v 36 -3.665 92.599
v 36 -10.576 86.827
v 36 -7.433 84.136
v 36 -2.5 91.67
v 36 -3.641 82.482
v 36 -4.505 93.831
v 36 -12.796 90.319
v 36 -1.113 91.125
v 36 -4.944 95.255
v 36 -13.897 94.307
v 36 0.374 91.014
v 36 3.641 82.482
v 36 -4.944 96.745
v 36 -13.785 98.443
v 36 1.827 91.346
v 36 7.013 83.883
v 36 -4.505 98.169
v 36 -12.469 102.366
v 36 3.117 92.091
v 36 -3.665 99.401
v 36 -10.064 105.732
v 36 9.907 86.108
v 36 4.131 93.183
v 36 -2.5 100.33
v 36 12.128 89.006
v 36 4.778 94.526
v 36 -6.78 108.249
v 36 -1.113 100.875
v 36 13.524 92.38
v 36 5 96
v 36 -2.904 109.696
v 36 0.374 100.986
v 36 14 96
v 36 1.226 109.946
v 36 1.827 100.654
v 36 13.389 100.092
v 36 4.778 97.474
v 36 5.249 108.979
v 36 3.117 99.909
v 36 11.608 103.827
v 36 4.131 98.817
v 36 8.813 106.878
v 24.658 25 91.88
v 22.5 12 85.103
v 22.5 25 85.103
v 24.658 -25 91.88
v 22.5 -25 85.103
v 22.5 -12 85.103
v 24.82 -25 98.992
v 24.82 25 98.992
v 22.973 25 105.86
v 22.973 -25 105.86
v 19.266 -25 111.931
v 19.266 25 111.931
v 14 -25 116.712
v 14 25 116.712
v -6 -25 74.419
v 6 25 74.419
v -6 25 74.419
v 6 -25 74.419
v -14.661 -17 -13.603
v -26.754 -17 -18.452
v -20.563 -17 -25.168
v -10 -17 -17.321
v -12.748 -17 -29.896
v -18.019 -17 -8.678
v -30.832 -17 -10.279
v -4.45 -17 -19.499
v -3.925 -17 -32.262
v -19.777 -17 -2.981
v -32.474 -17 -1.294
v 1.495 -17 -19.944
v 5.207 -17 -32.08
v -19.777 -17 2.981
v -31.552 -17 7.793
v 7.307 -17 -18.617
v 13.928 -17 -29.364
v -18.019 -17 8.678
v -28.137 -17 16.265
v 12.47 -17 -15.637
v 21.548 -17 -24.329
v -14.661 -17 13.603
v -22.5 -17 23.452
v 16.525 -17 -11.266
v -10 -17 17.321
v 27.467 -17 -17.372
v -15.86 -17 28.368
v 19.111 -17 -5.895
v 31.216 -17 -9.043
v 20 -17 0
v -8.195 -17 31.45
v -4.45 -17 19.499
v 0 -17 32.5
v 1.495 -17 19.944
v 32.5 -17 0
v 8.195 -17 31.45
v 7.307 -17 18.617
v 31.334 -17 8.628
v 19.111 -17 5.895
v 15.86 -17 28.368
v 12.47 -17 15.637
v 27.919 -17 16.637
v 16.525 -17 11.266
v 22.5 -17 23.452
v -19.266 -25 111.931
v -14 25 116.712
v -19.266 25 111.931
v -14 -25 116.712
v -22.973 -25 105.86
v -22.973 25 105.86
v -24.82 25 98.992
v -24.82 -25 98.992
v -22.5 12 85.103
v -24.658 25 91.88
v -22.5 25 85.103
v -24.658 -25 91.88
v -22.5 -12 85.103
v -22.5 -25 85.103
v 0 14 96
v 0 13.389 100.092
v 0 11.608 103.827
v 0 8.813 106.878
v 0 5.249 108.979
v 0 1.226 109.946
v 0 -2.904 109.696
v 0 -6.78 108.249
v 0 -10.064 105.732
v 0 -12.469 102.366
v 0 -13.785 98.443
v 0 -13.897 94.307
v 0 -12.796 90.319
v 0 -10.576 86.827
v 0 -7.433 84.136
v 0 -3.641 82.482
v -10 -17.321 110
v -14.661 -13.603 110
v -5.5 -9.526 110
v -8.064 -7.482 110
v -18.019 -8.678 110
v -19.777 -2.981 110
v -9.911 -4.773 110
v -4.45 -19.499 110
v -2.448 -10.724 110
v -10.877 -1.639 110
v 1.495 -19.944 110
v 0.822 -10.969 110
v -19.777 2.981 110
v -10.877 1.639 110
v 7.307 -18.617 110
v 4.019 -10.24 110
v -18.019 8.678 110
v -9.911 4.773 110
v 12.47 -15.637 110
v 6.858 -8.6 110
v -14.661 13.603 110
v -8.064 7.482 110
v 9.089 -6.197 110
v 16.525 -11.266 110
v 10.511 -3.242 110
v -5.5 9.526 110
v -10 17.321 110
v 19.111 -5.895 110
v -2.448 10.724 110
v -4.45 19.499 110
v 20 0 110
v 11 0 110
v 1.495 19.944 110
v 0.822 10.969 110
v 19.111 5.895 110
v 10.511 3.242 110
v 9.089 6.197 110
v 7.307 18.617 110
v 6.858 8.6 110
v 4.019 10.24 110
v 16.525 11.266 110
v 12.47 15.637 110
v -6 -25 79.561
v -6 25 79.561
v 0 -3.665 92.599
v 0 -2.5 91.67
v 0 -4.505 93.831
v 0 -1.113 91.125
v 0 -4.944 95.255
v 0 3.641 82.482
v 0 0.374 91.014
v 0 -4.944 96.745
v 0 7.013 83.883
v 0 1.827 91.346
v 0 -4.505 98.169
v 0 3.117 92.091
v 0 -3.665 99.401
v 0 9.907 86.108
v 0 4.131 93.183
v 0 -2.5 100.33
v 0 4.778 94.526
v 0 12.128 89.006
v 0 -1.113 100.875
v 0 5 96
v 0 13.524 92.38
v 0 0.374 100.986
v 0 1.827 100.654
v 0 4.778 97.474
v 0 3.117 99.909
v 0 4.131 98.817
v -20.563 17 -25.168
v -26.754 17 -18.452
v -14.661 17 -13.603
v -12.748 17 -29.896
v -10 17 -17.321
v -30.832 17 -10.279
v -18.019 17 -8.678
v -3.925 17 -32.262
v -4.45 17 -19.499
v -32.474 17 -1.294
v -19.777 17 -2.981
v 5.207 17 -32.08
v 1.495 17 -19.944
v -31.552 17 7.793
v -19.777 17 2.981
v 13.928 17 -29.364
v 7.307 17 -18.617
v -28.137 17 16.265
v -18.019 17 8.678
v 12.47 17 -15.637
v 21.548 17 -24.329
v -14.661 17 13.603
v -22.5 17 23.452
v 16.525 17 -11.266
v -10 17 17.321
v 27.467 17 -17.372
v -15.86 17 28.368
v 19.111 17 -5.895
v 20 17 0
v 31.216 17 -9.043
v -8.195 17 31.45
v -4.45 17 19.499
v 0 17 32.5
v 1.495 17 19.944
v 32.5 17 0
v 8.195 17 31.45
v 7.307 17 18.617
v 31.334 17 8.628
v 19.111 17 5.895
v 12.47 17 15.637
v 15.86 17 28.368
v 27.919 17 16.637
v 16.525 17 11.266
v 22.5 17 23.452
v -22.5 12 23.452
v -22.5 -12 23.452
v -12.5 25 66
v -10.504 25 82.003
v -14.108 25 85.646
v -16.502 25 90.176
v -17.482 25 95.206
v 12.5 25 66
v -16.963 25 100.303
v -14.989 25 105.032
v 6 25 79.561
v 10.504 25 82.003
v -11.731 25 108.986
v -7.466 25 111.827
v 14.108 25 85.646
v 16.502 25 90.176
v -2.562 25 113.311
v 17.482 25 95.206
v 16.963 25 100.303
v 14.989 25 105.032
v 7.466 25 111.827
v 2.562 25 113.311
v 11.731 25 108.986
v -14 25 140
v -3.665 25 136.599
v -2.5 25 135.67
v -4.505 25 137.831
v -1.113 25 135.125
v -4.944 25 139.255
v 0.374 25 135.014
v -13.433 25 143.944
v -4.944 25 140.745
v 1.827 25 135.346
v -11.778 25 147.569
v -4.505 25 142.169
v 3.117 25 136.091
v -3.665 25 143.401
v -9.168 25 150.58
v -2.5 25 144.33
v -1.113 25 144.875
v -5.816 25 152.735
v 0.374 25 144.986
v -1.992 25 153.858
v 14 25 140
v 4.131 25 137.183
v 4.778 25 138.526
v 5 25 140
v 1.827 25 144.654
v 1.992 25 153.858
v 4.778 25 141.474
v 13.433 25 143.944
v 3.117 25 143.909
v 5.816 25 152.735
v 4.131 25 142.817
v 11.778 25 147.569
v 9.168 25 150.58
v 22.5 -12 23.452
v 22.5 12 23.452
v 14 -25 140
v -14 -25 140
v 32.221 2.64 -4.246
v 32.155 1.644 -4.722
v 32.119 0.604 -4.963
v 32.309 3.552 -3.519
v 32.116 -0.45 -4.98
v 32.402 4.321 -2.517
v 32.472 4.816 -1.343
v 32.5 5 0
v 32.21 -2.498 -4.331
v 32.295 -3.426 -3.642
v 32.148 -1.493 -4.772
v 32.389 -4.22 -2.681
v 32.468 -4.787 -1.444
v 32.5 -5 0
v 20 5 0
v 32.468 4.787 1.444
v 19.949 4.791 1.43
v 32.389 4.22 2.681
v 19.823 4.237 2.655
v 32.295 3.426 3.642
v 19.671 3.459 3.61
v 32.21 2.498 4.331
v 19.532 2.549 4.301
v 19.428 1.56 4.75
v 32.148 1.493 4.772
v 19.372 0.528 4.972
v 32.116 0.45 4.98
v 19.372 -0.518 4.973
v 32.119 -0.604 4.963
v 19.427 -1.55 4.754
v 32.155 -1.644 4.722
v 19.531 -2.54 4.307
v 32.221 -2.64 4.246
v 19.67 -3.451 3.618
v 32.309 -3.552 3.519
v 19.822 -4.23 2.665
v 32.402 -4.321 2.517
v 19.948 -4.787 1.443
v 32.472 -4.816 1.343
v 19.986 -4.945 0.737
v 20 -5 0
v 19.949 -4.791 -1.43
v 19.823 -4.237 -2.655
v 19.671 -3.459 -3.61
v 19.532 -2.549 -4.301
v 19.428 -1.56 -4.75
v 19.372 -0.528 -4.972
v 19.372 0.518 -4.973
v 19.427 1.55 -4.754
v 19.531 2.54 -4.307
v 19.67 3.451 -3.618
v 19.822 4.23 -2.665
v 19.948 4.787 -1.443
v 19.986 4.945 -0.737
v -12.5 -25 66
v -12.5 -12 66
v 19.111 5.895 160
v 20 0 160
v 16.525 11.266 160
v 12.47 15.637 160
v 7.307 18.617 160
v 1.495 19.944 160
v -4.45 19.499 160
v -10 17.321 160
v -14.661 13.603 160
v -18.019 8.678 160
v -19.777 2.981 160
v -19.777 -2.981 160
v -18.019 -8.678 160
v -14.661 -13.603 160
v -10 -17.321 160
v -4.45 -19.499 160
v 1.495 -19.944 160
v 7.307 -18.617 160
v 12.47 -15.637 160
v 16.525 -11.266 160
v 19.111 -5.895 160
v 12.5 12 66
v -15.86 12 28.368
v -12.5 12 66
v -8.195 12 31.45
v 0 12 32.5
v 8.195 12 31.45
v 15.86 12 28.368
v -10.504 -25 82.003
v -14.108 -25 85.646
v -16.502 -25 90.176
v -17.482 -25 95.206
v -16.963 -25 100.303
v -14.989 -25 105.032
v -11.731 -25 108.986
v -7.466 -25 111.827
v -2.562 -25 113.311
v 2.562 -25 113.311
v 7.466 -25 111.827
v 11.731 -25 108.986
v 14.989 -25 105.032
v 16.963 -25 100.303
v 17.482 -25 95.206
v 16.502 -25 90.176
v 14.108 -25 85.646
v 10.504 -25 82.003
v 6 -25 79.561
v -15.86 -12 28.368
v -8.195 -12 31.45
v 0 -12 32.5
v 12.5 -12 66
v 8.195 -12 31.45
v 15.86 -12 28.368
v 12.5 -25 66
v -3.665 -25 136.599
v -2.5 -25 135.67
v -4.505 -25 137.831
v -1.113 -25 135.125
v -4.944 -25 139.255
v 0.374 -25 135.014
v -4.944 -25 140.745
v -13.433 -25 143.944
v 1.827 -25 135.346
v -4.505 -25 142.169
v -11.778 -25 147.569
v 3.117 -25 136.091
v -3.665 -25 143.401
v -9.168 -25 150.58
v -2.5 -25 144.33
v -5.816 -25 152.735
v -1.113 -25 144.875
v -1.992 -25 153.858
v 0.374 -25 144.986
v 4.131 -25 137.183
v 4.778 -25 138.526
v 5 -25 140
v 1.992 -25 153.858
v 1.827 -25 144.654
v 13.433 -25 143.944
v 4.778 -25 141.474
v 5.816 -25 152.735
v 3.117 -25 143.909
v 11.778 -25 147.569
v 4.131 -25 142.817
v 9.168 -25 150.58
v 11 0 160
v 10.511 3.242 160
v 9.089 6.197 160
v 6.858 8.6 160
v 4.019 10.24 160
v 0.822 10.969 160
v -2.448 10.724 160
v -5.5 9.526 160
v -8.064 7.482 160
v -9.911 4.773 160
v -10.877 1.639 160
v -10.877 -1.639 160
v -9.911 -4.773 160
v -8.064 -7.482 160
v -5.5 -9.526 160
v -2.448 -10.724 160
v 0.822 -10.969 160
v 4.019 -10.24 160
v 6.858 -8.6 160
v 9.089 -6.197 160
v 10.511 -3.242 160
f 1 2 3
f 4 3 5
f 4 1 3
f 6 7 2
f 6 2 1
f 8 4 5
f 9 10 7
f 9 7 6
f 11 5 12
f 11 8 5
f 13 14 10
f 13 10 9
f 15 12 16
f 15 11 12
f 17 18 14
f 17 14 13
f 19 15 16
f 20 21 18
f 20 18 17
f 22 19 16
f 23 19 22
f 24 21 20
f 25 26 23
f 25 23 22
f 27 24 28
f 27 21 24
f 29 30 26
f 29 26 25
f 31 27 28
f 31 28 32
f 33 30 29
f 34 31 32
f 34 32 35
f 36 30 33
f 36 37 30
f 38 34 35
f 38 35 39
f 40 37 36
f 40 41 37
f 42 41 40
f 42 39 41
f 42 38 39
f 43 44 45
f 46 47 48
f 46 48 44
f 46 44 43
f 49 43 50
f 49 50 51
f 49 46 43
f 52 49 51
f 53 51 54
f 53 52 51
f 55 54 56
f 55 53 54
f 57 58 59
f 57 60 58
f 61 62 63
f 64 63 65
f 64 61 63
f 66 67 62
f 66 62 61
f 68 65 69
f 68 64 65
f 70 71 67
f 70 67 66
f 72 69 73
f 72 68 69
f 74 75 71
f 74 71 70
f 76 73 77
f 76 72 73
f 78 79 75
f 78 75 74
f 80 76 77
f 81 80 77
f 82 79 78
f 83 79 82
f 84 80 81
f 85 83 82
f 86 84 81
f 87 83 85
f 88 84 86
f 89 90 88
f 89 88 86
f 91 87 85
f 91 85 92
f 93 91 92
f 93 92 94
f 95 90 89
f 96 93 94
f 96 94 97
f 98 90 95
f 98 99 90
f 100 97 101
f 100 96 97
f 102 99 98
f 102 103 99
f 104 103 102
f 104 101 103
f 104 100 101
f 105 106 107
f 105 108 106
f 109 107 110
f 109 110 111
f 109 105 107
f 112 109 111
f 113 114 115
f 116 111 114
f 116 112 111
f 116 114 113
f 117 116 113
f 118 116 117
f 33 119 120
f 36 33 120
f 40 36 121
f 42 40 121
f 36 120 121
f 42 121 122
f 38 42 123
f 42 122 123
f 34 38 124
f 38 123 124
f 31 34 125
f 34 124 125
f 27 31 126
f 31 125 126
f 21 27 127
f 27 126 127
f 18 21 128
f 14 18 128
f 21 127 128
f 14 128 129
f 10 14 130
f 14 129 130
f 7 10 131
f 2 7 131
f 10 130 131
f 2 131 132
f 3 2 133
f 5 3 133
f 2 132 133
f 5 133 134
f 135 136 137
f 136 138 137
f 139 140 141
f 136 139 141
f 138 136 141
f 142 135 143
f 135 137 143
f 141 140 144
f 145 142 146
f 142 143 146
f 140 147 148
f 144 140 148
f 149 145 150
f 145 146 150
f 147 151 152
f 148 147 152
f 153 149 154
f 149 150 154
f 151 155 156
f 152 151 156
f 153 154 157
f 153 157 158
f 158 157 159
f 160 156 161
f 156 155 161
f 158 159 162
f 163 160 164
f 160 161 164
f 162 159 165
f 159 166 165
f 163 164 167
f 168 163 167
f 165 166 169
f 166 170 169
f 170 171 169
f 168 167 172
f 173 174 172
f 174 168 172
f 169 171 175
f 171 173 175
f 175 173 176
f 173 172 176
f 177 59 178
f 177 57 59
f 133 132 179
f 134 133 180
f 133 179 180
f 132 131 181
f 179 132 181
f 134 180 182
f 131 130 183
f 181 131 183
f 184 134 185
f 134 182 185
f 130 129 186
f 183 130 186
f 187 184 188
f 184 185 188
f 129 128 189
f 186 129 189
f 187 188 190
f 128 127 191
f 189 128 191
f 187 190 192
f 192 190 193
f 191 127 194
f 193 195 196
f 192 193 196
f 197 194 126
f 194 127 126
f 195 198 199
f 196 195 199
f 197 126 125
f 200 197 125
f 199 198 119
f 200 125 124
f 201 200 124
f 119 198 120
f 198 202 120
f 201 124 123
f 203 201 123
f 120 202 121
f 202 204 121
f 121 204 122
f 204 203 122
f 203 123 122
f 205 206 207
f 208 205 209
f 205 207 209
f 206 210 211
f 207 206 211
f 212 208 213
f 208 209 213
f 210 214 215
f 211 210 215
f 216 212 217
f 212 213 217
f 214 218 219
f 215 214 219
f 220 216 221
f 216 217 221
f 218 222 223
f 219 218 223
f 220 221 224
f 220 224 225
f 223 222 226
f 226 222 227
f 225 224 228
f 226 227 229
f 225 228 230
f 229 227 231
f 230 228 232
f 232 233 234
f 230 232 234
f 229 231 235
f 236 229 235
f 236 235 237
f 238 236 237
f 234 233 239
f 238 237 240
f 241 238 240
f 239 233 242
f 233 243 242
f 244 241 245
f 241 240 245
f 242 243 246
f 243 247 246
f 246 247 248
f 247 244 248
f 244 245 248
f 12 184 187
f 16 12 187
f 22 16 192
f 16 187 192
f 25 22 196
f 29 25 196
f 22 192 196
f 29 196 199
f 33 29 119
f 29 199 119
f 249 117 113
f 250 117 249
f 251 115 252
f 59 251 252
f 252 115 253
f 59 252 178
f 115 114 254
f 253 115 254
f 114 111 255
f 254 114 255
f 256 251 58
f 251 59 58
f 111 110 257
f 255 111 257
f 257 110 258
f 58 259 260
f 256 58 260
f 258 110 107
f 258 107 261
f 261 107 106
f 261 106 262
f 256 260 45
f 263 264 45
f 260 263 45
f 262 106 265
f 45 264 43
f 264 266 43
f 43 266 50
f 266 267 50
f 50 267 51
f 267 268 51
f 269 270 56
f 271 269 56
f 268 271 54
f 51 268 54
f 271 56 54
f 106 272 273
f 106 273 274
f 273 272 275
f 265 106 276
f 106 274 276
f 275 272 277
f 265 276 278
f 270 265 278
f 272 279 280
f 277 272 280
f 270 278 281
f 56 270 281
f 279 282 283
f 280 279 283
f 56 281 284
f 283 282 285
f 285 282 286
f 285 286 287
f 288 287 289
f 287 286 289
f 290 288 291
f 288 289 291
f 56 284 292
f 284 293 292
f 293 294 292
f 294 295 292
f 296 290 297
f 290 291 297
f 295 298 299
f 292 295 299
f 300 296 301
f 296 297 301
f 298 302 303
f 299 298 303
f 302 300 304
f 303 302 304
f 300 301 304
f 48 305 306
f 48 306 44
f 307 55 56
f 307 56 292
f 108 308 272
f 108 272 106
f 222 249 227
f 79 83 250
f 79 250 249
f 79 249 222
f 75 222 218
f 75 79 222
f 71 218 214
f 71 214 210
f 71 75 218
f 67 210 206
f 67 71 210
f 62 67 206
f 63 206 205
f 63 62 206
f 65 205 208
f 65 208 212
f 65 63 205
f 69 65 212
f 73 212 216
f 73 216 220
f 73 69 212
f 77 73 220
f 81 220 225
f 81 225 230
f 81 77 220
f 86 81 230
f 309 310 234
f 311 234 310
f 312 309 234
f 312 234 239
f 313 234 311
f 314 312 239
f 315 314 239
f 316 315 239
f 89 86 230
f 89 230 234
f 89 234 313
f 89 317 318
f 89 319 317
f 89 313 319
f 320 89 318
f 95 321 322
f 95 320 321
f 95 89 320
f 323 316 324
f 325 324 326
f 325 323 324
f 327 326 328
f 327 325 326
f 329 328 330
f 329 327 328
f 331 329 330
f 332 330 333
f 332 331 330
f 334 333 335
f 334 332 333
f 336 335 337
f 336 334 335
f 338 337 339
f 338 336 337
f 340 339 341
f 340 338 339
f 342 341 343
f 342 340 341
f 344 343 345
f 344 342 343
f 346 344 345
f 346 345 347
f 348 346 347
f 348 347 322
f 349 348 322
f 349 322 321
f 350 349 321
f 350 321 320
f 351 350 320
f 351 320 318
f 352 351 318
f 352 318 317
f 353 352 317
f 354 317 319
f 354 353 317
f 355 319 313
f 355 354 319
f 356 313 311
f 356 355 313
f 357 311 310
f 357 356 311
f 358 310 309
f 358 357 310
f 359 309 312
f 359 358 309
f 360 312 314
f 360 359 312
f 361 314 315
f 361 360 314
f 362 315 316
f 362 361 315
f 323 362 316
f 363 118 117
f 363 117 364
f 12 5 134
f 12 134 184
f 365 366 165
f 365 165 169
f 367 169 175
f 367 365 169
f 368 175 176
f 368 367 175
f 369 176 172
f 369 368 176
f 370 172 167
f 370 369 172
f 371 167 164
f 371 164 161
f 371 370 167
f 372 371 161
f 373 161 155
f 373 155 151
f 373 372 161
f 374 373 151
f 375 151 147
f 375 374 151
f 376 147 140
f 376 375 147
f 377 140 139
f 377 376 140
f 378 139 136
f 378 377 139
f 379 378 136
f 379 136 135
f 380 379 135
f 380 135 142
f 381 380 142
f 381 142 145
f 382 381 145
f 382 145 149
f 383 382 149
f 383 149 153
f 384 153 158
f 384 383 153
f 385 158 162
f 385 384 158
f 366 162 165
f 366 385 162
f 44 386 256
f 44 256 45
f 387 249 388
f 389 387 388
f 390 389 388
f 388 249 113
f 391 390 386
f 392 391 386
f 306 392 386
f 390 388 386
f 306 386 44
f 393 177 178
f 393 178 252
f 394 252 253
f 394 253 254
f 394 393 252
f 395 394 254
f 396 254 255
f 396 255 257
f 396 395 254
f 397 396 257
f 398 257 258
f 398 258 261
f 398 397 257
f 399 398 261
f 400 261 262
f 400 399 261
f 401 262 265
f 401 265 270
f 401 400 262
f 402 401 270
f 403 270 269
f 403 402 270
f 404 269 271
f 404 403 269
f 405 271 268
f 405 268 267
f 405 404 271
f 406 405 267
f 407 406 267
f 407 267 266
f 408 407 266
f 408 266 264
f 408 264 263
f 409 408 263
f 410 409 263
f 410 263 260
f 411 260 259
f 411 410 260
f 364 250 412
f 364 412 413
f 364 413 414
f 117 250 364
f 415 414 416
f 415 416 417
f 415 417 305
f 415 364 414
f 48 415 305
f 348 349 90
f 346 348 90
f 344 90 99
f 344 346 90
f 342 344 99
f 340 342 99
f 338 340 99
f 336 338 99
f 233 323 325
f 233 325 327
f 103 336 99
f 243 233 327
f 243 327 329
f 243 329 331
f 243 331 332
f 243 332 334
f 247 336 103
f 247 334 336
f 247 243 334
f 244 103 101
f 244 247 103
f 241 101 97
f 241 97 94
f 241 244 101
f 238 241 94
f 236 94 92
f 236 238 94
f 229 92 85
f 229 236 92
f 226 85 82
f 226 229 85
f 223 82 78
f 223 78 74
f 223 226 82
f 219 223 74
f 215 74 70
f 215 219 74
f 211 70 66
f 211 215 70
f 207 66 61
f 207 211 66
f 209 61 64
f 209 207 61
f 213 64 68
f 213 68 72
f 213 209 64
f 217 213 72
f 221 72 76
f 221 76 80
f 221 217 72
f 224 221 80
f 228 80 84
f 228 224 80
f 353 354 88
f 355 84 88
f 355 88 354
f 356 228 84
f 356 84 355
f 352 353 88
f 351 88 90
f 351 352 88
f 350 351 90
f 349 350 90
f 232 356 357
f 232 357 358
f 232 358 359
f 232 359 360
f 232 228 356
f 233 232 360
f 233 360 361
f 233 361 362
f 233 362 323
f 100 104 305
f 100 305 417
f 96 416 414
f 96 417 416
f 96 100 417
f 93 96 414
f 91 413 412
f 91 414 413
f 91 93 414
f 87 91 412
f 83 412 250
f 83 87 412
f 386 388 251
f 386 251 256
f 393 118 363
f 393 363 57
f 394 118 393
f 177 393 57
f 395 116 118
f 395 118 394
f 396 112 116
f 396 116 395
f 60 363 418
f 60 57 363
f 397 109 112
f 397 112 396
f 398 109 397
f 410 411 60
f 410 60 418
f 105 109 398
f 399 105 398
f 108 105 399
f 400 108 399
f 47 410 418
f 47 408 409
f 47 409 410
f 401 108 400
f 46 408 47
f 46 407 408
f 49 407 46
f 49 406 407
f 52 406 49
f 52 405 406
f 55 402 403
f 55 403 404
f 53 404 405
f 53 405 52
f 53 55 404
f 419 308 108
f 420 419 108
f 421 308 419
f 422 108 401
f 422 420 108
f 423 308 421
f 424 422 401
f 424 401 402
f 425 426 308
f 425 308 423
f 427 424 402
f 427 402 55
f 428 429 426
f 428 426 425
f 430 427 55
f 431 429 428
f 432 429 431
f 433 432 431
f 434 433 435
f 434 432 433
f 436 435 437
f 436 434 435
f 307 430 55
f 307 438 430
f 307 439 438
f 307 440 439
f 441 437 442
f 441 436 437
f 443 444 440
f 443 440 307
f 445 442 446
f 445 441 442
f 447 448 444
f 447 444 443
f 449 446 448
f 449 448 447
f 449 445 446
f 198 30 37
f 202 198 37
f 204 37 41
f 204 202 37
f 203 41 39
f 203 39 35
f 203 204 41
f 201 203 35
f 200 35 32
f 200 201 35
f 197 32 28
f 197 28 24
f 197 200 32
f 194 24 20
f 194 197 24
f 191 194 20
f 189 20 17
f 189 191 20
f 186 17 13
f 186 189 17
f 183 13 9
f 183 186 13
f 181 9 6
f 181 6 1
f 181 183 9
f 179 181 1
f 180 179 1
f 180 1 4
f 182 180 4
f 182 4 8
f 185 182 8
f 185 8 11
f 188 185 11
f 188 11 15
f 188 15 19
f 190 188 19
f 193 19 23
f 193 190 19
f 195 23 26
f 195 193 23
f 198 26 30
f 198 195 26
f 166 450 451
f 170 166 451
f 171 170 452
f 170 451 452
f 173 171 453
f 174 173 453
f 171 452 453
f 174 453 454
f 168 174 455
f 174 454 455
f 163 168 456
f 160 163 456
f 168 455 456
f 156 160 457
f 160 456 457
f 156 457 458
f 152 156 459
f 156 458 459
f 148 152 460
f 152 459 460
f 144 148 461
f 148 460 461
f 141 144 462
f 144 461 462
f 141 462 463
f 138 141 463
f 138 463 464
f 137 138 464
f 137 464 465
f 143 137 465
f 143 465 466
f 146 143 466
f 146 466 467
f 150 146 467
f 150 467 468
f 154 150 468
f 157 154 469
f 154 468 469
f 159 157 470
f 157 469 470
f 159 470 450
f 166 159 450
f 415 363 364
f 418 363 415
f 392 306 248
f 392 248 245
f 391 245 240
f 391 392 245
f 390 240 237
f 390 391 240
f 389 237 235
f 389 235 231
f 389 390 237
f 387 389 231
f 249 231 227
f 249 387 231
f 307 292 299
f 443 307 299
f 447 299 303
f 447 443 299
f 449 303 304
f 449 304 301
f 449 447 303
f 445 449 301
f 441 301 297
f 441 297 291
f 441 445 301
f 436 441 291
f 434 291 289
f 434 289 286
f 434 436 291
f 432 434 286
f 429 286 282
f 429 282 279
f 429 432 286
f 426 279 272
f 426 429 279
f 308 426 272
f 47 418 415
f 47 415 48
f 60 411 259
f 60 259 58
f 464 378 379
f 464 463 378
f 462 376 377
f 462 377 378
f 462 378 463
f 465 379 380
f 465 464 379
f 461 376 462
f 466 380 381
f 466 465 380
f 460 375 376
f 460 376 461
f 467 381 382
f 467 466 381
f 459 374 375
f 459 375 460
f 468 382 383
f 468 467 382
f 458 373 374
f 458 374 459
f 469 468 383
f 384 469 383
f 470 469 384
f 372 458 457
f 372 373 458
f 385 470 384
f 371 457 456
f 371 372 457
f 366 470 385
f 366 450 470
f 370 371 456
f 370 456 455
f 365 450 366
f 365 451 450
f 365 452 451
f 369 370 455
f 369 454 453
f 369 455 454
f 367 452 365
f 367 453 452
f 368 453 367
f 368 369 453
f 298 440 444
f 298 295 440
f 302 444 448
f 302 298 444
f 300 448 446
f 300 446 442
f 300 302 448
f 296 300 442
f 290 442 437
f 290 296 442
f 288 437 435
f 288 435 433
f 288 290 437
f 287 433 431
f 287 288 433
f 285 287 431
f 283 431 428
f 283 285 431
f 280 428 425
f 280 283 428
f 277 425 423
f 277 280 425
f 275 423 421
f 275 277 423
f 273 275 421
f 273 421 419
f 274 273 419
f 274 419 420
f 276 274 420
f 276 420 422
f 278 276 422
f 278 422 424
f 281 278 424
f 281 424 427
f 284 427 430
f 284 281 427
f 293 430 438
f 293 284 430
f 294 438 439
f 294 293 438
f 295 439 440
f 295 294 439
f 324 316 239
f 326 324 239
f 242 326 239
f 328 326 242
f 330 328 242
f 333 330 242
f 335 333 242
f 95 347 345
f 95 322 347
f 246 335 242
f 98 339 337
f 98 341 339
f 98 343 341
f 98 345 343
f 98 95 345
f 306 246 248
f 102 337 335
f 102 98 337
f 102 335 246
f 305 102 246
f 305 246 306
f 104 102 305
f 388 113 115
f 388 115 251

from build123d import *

# Parameters (mm, degrees)
F4_R      = 20
F4_R_2    = 11
F5_DEPTH  = 50
F0_R      = 5
F6_DEPTH  = 25
F0_R_2    = 20
F7_DEPTH  = 17
F1_R      = 5
F8_DEPTH  = 100
F9_DEPTH  = 12
F10_DEPTH = 36


with BuildPart() as f5:
    # F4 (on offset) → F5 (new body)
    with BuildSketch(Plane.XY.offset(160)):
        Circle(F4_R)
        Circle(F4_R_2, mode=Mode.SUBTRACT)
    extrude(amount=-F5_DEPTH)


with BuildPart() as f6:
    # F0 (on Front) → F6 (new body, symmetric)
    with BuildSketch(Plane.XZ):
        with BuildLine():
            Line((12.5, 66), (22.5, 85.102753))
            ThreePointArc((22.5, 85.102753), (24.142361, 102.492025), (14, 116.712315))
            Line((14, 116.712315), (14, 140))
            ThreePointArc((14, 140), (0, 154), (-14, 140))
            Line((-14, 140), (-14, 116.712315))
            ThreePointArc((-14, 116.712315), (-24.142361, 102.492025), (-22.5, 85.102753))
            Line((-22.5, 85.102753), (-12.5, 66))
            Line((-12.5, 66), (0, 66))
            Line((0, 66), (12.5, 66))
        make_face()
        with BuildLine():
            ThreePointArc((-6, 79.560718), (0, 113.5), (6, 79.560718))
            Line((6, 79.560718), (6, 74.418526))
            Line((6, 74.418526), (-6, 74.418526))
            Line((-6, 74.418526), (-6, 79.560718))
        make_face(mode=Mode.SUBTRACT)
        with Locations((0, 140)):
            Circle(F0_R, mode=Mode.SUBTRACT)
    extrude(amount=F6_DEPTH, both=True)



with BuildPart() as f7:
    # F0 (on Front) → F7 (new body, symmetric)
    with BuildSketch(Plane.XZ):
        with BuildLine():
            ThreePointArc((-22.5, 23.452079), (-12.747549, -29.895652), (32.5, 0))
            ThreePointArc((32.5, 0), (29.895652, 12.747549), (22.5, 23.452079))
            ThreePointArc((22.5, 23.452079), (0, 32.5), (-22.5, 23.452079))
        make_face()
        Circle(F0_R_2, mode=Mode.SUBTRACT)
    extrude(amount=F7_DEPTH, both=True)

    # F1 (on Right) → F8 (cut)
    with BuildSketch(Plane.YZ):
        Circle(F1_R)
    extrude(amount=F8_DEPTH, mode=Mode.SUBTRACT)


with BuildPart() as f6_1:
    add(f6.part)

    add(f7.part)  # F9 merges F7
    # F0 (on Front) → F9 (join, symmetric)
    with BuildSketch(Plane.XZ):
        with BuildLine():
            ThreePointArc((-22.5, 23.452079), (0, 32.5), (22.5, 23.452079))
            Line((22.5, 23.452079), (22.5, 85.102753))
            Line((22.5, 85.102753), (12.5, 66))
            Line((12.5, 66), (0, 66))
            Line((0, 66), (-12.5, 66))
            Line((-12.5, 66), (-22.5, 85.102753))
            Line((-22.5, 85.102753), (-22.5, 23.452079))
        make_face()
    extrude(amount=F9_DEPTH, both=True)


with BuildPart() as f10:
    # F1 (on Right) → F10 (new body)
    with BuildSketch(Plane.YZ):
        with BuildLine():
            ThreePointArc((3.641003, 82.481749), (11.112471, 87.484545), (14, 96))
            ThreePointArc((14, 96), (-8.515455, 107.112471), (-3.641003, 82.481749))
            Line((-3.641003, 82.481749), (3.641003, 82.481749))
        make_face()
        with Locations((0, 96)):
            Circle(F1_R, mode=Mode.SUBTRACT)
    extrude(amount=F10_DEPTH)


solid = Compound([f5.part, f6_1.part, f10.part])
